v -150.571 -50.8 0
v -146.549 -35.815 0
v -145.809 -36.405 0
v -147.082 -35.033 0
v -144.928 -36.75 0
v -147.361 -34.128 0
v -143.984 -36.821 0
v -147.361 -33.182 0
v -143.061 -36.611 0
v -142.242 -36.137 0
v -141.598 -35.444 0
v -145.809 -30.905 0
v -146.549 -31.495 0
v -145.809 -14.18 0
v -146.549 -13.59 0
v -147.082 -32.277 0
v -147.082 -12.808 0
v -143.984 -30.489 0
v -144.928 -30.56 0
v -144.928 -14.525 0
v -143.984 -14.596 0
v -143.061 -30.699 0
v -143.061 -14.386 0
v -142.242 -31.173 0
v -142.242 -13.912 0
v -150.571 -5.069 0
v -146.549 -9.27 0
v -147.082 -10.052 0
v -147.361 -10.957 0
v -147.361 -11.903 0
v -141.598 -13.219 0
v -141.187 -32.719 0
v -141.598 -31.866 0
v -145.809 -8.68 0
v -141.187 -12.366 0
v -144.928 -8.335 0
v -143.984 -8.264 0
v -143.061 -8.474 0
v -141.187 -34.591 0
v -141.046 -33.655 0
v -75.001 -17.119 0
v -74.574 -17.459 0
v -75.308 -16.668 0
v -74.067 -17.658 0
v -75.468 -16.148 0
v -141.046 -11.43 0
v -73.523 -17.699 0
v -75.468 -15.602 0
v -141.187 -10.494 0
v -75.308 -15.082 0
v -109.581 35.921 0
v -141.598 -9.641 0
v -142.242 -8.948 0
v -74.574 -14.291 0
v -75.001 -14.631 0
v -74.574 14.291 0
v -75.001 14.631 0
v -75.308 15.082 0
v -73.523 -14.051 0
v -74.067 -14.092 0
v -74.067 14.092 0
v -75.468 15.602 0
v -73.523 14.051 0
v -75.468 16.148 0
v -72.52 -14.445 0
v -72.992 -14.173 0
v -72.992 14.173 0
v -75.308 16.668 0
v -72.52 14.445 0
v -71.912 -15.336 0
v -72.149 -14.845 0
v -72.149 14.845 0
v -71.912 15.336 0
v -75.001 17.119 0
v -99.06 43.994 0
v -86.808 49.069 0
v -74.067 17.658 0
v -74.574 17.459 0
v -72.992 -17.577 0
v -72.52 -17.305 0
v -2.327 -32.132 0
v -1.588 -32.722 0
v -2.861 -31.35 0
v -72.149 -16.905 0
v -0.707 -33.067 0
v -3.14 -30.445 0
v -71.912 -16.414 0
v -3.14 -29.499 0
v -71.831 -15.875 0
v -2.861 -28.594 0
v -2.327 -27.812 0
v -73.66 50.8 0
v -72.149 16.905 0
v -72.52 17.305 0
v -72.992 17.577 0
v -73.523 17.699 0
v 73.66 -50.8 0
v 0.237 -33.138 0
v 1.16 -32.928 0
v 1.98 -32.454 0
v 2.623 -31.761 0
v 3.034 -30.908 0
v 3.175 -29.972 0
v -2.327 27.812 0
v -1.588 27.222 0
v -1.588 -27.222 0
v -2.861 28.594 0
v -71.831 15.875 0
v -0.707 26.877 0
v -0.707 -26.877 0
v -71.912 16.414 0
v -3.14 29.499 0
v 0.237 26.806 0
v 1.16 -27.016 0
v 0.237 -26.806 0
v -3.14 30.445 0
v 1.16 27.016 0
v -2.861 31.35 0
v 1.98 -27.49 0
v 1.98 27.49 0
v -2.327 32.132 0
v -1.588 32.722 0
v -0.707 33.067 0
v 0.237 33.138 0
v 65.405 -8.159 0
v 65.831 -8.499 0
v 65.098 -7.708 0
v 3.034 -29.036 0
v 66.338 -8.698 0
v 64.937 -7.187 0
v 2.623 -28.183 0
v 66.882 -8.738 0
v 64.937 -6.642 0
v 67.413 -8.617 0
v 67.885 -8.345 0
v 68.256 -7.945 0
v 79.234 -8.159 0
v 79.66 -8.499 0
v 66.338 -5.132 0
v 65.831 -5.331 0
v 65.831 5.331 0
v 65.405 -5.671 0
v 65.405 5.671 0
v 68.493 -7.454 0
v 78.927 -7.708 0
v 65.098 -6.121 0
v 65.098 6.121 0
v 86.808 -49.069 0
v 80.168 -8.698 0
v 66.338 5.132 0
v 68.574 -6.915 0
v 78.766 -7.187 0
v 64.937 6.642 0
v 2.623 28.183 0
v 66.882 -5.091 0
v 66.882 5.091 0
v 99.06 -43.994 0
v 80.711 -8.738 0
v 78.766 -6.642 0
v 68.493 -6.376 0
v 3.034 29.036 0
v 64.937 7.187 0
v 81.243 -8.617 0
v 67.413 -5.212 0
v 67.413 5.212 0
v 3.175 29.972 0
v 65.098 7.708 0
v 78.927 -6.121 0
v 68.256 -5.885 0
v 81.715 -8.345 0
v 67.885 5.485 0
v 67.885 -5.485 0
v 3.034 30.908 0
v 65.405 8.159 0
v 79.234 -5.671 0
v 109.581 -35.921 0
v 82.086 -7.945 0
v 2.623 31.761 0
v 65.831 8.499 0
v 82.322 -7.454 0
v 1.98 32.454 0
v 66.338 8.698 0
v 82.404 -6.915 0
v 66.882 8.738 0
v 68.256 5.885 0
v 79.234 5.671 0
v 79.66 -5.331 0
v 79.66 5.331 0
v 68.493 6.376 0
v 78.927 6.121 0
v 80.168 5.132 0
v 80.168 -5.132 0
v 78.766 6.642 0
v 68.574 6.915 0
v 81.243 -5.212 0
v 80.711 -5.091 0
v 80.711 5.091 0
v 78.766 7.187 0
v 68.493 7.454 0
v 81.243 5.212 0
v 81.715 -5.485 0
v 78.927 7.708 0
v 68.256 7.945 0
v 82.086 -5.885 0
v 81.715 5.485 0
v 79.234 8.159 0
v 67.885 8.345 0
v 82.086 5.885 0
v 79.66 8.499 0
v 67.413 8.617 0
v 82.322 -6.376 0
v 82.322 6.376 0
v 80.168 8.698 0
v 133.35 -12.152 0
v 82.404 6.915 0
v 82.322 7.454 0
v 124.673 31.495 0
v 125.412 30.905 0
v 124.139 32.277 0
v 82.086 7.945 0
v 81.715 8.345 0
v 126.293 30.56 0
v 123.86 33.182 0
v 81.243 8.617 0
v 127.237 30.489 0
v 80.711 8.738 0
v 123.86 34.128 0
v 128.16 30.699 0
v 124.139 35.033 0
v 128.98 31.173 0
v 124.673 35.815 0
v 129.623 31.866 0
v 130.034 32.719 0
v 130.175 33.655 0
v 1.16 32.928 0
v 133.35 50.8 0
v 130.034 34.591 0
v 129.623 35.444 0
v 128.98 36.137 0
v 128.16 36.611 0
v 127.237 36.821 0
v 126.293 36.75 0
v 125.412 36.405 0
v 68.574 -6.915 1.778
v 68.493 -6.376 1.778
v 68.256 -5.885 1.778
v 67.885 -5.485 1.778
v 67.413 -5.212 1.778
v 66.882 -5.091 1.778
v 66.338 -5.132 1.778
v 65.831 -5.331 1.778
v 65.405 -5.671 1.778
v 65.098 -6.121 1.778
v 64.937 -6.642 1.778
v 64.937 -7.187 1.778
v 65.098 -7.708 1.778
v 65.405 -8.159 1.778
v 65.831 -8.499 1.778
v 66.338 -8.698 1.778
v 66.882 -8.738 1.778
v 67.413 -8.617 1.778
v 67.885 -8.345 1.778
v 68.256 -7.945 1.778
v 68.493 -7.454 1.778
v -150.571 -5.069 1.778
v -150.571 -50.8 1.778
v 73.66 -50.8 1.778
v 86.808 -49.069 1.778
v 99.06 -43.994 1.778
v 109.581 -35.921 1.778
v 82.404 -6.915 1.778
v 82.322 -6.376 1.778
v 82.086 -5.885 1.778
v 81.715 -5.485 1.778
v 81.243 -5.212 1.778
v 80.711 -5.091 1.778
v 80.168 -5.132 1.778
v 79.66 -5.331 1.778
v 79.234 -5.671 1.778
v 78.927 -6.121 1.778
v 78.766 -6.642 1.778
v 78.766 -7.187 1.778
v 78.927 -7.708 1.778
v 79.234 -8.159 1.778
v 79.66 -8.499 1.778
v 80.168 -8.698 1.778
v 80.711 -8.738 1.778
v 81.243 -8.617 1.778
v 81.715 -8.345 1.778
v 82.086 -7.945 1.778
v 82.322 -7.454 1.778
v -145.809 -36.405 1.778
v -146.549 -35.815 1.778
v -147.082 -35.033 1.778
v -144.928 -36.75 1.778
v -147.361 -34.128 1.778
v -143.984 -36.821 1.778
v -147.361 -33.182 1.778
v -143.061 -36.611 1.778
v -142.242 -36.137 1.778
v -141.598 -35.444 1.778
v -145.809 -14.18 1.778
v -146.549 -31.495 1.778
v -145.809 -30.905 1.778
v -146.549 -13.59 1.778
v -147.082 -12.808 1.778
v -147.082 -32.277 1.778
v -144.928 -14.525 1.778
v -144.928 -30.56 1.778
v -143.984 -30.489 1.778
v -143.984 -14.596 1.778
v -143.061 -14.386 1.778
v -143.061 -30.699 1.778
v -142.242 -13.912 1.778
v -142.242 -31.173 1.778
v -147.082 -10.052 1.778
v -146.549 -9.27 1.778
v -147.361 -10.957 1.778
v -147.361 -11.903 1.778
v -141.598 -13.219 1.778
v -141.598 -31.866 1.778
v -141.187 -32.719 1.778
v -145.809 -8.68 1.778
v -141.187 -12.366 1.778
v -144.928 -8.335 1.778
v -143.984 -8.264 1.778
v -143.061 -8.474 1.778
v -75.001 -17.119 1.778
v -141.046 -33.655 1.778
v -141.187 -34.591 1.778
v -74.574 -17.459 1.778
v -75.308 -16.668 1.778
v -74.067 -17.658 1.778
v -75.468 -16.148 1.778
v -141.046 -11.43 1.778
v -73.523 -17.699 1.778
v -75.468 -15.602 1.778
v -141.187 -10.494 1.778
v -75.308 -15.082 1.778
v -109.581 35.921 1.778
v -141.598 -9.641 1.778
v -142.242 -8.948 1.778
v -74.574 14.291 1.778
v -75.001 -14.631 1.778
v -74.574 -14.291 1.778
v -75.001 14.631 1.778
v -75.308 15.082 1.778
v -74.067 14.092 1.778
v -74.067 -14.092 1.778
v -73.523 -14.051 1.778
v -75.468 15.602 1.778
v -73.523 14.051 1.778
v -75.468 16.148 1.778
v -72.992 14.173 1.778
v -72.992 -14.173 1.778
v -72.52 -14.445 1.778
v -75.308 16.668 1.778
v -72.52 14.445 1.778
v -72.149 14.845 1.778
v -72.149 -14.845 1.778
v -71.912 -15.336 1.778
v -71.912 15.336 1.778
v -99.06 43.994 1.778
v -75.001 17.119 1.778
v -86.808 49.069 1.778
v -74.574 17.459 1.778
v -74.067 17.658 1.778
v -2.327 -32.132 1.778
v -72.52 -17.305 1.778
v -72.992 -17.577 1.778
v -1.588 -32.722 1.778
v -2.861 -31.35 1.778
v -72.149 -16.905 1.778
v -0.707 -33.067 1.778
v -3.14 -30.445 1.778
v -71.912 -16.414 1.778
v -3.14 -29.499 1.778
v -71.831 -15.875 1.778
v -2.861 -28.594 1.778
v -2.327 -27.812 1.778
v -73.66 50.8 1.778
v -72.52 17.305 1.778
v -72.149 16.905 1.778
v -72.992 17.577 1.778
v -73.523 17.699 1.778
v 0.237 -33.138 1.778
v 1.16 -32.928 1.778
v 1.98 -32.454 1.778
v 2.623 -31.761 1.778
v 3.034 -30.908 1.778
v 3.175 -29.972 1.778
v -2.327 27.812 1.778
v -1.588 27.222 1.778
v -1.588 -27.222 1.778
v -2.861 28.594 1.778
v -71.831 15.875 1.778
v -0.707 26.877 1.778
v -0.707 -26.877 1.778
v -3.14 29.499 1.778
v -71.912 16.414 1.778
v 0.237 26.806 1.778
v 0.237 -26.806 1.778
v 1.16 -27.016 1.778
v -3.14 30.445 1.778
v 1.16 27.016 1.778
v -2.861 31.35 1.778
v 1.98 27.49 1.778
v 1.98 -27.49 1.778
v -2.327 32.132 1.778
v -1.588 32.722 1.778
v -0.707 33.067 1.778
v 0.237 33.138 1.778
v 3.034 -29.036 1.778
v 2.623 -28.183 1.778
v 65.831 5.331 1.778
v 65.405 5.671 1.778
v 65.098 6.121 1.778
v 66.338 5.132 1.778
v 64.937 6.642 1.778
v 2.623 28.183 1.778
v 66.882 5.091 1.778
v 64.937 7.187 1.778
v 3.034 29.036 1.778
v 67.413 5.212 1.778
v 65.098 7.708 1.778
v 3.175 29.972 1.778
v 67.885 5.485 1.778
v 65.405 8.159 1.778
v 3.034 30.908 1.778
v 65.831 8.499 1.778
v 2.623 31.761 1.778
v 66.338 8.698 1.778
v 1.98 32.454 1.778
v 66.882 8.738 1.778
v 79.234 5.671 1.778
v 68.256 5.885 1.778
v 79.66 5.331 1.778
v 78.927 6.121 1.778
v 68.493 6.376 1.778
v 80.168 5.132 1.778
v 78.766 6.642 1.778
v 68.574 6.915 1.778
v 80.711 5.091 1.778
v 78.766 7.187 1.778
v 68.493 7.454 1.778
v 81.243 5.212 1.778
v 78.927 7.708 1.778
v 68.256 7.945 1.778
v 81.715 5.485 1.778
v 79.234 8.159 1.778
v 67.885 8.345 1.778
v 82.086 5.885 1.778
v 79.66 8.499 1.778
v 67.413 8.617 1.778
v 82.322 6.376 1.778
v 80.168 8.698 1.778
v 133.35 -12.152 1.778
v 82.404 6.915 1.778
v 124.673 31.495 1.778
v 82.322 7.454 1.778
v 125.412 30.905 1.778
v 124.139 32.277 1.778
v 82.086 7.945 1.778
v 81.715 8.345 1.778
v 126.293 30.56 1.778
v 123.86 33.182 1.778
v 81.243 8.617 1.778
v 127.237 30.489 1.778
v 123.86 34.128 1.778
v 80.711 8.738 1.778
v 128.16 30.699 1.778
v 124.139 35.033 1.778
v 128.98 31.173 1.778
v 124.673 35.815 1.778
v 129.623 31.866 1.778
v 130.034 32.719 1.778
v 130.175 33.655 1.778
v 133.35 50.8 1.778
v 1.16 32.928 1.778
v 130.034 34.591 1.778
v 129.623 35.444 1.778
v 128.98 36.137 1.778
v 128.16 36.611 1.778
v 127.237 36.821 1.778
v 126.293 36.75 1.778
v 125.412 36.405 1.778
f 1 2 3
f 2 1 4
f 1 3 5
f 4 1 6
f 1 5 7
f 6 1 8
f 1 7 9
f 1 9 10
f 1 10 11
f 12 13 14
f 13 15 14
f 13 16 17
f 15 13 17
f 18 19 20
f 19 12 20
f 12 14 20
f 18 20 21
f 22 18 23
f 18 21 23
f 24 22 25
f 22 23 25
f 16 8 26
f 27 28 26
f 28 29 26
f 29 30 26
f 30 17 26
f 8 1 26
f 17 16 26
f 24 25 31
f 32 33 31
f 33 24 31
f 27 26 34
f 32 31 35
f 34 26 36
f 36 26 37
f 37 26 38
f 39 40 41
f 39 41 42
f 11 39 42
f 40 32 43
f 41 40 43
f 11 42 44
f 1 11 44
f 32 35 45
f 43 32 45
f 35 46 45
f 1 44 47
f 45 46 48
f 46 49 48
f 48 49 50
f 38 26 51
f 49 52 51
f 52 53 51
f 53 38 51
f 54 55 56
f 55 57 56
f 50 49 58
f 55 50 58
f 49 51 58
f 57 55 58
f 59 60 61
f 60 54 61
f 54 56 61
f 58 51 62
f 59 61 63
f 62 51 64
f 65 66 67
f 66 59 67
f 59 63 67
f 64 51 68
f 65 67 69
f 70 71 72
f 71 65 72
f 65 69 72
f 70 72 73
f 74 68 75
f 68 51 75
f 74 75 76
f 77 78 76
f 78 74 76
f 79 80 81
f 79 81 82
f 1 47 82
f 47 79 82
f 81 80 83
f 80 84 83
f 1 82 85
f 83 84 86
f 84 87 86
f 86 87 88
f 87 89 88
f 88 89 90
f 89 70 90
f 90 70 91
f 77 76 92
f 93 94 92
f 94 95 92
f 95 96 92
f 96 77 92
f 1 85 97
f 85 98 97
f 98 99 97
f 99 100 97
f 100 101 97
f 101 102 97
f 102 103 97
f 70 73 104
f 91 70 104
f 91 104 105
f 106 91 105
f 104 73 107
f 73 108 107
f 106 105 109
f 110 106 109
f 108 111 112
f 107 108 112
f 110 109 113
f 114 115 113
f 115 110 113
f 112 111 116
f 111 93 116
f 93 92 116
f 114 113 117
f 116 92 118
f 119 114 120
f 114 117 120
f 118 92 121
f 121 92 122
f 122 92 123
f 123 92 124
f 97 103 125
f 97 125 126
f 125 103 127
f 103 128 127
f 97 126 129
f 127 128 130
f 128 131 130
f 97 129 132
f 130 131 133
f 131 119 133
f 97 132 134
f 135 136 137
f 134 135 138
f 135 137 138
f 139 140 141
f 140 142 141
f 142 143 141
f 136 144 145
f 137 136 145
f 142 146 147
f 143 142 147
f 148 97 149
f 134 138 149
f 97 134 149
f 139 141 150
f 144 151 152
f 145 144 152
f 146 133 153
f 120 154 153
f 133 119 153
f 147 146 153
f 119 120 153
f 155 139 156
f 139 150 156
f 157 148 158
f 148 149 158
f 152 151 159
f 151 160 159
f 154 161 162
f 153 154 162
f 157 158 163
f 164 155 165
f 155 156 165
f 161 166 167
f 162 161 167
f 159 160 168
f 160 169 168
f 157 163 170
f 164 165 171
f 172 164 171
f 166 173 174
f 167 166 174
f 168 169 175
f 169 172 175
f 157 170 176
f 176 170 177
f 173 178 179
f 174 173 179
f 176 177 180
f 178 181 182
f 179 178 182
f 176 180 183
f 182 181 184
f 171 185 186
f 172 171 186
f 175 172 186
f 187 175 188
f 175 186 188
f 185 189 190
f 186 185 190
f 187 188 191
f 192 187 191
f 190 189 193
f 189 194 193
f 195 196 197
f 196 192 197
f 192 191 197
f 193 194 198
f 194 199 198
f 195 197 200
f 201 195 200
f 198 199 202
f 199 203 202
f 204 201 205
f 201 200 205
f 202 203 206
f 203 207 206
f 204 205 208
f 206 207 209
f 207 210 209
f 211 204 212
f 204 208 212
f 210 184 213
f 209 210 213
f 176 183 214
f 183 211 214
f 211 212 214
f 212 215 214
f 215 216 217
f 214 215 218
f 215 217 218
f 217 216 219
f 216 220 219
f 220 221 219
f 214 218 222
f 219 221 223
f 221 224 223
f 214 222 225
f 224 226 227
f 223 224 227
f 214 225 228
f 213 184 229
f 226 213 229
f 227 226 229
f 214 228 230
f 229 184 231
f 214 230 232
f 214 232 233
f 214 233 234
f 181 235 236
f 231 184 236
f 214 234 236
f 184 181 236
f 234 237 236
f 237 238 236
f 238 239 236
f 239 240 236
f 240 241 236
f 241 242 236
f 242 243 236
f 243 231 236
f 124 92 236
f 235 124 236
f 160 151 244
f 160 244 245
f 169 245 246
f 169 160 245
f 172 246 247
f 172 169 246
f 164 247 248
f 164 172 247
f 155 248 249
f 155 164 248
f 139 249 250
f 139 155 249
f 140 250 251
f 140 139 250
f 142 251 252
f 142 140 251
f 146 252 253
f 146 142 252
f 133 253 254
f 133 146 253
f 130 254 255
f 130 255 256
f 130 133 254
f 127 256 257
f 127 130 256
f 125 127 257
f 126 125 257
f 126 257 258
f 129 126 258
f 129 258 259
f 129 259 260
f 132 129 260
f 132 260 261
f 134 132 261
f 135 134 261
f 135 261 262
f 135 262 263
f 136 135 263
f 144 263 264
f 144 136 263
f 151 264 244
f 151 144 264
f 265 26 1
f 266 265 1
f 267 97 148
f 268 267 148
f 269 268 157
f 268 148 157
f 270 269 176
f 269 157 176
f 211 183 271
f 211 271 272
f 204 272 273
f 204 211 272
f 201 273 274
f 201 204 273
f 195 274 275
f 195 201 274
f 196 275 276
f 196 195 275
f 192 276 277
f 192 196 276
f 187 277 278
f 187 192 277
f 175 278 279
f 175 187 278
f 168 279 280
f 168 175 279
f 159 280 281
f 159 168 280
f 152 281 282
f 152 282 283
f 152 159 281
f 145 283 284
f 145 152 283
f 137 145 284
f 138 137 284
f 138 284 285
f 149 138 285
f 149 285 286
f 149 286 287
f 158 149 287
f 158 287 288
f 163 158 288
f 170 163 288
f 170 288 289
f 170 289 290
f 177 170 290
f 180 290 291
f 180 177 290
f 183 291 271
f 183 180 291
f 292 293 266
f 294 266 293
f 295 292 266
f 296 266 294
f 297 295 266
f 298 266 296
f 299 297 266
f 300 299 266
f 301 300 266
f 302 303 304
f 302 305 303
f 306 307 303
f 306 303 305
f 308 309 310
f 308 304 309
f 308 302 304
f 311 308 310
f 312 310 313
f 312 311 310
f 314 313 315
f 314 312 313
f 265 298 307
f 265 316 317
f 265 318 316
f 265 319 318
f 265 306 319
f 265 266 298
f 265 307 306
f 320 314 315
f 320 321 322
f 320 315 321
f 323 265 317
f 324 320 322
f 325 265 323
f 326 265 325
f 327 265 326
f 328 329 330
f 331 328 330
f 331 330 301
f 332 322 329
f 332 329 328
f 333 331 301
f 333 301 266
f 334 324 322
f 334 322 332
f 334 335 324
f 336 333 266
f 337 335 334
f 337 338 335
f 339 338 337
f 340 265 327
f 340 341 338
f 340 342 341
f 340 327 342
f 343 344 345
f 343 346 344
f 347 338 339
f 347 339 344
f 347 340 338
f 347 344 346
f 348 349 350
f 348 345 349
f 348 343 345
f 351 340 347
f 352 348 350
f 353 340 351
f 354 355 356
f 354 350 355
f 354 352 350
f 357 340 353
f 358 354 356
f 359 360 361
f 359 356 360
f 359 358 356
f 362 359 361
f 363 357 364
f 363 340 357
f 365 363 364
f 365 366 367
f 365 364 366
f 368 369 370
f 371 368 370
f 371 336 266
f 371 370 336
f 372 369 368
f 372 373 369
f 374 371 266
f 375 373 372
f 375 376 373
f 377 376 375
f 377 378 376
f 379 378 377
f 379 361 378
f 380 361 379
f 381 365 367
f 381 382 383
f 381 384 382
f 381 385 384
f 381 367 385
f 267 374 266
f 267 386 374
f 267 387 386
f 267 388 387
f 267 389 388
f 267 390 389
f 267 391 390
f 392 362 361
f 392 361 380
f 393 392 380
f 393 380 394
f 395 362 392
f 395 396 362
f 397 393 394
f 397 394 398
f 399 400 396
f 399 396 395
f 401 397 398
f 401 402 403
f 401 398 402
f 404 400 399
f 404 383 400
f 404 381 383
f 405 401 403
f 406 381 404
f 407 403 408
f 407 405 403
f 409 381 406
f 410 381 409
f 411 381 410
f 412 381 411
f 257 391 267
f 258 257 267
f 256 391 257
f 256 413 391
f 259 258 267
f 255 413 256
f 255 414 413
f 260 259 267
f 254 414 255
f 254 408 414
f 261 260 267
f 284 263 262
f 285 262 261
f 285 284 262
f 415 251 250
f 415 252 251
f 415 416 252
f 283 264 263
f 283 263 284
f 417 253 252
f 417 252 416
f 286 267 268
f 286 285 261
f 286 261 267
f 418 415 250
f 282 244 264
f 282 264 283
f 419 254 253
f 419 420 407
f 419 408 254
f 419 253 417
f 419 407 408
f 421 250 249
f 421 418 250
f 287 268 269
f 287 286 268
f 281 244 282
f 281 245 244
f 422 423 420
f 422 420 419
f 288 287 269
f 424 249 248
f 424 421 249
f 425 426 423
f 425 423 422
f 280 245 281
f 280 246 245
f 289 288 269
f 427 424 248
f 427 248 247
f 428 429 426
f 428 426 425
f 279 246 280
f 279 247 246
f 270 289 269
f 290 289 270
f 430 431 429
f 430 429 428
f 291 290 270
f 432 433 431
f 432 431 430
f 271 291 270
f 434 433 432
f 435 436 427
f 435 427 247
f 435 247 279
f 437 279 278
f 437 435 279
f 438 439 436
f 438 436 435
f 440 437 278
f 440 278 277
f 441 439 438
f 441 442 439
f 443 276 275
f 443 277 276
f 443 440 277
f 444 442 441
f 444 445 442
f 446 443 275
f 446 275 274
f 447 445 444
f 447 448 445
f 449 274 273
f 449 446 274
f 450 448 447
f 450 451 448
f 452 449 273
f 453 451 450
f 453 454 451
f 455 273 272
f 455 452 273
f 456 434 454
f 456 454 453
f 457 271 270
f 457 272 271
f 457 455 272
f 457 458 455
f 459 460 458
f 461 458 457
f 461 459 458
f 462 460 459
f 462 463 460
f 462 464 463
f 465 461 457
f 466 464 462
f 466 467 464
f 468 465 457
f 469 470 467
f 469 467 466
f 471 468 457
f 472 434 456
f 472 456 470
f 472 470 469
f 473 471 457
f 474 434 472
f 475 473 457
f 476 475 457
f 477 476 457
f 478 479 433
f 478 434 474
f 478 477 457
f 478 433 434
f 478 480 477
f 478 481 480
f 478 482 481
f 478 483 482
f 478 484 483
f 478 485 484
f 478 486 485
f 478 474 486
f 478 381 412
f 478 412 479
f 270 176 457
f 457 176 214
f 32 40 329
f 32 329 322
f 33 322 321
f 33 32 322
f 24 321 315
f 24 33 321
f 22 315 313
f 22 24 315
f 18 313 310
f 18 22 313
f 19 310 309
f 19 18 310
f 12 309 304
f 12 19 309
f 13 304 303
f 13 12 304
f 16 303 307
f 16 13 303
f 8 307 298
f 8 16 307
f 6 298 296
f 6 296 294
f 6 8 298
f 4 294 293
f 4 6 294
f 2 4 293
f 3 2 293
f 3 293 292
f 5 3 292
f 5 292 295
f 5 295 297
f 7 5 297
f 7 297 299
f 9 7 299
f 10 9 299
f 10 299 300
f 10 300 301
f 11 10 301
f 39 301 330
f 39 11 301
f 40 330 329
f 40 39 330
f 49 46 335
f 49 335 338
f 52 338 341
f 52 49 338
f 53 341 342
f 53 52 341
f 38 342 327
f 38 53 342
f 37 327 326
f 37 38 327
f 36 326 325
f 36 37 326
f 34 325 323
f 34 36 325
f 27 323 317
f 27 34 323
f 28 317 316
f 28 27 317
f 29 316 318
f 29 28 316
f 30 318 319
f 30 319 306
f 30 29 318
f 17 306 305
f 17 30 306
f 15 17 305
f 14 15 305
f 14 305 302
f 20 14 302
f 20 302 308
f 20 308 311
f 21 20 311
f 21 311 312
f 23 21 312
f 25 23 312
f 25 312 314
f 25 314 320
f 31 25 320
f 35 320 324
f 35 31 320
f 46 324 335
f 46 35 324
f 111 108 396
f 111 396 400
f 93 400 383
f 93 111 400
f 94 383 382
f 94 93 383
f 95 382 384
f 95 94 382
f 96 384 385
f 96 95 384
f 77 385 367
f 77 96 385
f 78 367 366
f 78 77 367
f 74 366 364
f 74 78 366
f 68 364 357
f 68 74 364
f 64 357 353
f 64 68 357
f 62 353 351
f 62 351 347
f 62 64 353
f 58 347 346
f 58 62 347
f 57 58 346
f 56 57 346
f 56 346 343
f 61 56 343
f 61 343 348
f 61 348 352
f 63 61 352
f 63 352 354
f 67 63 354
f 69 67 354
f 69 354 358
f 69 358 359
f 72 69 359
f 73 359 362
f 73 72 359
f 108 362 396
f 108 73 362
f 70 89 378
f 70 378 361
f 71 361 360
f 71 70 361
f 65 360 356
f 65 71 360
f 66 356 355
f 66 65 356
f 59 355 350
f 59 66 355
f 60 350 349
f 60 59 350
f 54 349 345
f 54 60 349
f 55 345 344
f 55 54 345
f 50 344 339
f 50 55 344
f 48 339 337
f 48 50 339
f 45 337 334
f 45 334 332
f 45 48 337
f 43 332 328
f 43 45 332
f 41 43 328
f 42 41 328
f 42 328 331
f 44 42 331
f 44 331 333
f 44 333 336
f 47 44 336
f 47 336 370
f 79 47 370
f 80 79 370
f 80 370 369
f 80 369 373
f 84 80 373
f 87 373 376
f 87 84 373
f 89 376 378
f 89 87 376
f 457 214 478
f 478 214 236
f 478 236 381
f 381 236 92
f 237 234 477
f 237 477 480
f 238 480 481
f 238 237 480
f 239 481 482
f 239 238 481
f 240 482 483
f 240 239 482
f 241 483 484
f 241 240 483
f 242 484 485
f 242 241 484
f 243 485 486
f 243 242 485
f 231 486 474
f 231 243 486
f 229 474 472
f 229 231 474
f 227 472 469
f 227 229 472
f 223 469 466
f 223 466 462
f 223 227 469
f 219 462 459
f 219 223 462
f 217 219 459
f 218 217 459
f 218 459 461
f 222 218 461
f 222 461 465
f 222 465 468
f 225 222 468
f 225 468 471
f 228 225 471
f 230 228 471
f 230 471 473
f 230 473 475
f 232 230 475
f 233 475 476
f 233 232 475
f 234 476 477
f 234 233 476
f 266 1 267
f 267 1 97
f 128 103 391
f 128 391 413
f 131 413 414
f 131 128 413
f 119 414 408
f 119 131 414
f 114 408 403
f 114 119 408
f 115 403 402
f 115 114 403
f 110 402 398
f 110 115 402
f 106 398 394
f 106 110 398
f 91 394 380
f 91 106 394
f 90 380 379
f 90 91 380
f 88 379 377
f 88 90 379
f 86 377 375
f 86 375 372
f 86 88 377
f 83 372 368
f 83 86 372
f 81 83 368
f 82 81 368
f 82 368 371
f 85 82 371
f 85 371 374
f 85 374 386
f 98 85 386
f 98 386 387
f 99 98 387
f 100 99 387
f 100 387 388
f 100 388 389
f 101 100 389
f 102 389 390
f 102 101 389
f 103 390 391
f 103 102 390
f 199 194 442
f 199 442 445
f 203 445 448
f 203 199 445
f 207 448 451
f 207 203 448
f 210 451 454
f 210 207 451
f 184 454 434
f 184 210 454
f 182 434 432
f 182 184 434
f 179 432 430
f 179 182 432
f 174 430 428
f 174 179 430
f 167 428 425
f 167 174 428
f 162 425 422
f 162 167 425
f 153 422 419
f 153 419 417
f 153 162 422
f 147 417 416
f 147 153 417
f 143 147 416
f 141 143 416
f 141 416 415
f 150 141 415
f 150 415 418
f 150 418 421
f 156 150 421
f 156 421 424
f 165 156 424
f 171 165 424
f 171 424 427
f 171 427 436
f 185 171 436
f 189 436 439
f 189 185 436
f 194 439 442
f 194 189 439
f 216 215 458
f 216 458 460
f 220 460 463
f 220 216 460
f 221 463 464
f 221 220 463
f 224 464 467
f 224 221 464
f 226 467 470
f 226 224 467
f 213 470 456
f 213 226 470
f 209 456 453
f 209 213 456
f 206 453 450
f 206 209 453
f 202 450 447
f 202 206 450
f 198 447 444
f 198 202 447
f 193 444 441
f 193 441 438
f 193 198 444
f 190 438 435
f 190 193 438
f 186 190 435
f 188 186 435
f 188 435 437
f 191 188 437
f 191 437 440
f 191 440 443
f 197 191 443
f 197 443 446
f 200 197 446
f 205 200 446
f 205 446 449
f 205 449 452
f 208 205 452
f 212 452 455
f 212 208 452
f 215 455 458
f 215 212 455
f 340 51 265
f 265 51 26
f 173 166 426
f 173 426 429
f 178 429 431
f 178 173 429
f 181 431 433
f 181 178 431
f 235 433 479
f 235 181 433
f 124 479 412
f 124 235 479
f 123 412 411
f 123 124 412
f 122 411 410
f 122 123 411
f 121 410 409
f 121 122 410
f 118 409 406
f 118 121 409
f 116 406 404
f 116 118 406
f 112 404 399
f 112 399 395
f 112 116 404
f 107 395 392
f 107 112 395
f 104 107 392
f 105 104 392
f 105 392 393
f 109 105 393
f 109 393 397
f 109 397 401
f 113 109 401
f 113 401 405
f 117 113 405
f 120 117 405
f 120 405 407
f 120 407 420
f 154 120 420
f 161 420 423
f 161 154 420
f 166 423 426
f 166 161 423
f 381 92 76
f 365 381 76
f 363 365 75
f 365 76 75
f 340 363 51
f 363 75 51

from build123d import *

# Parameters (mm, degrees)
F0_R     = 3.175
F0_R_2   = 1.8288
F1_DEPTH = 1.778


with BuildPart() as f1:
    # F0 (on Top) → F1 (new body)
    with BuildSketch(Plane.XY):
        with BuildLine():
            Line((133.35, -12.1520489686), (133.35, 50.8))
            Line((133.35, 50.8), (73.66, 50.8))
            ThreePointArc((73.66, 50.8), (109.5810244843, 35.9210244843), (124.46, 0))
            ThreePointArc((124.46, 0), (120.5930802516, -19.4403183641), (109.5810244843, -35.9210244843))
            Line((109.5810244843, -35.9210244843), (133.35, -12.1520489686))
        make_face()
        with Locations((127, 33.655)):
            Circle(F0_R, mode=Mode.SUBTRACT)
        with BuildLine():
            ThreePointArc((73.66, -50.8), (22.86, 0), (73.66, 50.8))
            Line((73.66, 50.8), (-73.6599997452, 50.8))
            ThreePointArc((-73.6599997452, 50.8), (-37.7389754256, 35.9210243942), (-22.86, 0))
            ThreePointArc((-22.86, 0), (-37.7389756058, -35.9210245744), (-73.6600002548, -50.8))
            Line((-73.6600002548, -50.8), (73.66, -50.8))
        make_face()
        with Locations((0, -29.972)):
            Circle(F0_R, mode=Mode.SUBTRACT)
        with Locations((0, 29.972)):
            Circle(F0_R, mode=Mode.SUBTRACT)
        with BuildLine():
            ThreePointArc((124.46, 0), (109.5810244843, 35.9210244843), (73.66, 50.8))
            ThreePointArc((73.66, 50.8), (22.86, 0), (73.66, -50.8))
            ThreePointArc((73.66, -50.8), (93.1003183641, -46.9330802516), (109.5810244843, -35.9210244843))
            ThreePointArc((109.5810244843, -35.9210244843), (120.5930802516, -19.4403183641), (124.46, 0))
        make_face()
        with Locations((66.7452027868, -6.9147972132)):
            Circle(F0_R_2, mode=Mode.SUBTRACT)
        with Locations((80.5747972132, -6.9147972132)):
            Circle(F0_R_2, mode=Mode.SUBTRACT)
        with Locations((66.7452027868, 6.9147972132)):
            Circle(F0_R_2, mode=Mode.SUBTRACT)
        with Locations((80.5747972132, 6.9147972132)):
            Circle(F0_R_2, mode=Mode.SUBTRACT)
        with BuildLine():
            ThreePointArc((-22.86, 0), (-37.7389754256, 35.9210243942), (-73.6599997452, 50.8))
            ThreePointArc((-73.6599997452, 50.8), (-93.1003182465, 46.9330803003), (-109.5810244843, 35.9210244843))
            ThreePointArc((-109.5810244843, 35.9210244843), (-120.5930803003, -19.4403182465), (-73.6600002548, -50.8))
            ThreePointArc((-73.6600002548, -50.8), (-37.7389756058, -35.9210245744), (-22.86, 0))
        make_face()
        with Locations((-73.66, -15.875)):
            Circle(F0_R_2, mode=Mode.SUBTRACT)
        with Locations((-73.66, 15.875)):
            Circle(F0_R_2, mode=Mode.SUBTRACT)
        with BuildLine():
            ThreePointArc((-73.6600002548, -50.8), (-120.5930803003, -19.4403182465), (-109.5810244843, 35.9210244843))
            Line((-109.5810244843, 35.9210244843), (-133.35, 12.1520489686))
            Line((-133.35, 12.1520489686), (-133.35, -50.8))
            Line((-133.35, -50.8), (-73.6600002548, -50.8))
        make_face()
        Polygon((-133.35, -50.8), (-133.35, 12.1520489686), (-150.5712, -5.0691510314), (-150.5712, -50.8), align=None)
        with Locations((-144.2212, -33.655)):
            Circle(F0_R, mode=Mode.SUBTRACT)
        with Locations((-144.2212, -11.43)):
            Circle(F0_R, mode=Mode.SUBTRACT)
    extrude(amount=F1_DEPTH)


solid = f1.part
